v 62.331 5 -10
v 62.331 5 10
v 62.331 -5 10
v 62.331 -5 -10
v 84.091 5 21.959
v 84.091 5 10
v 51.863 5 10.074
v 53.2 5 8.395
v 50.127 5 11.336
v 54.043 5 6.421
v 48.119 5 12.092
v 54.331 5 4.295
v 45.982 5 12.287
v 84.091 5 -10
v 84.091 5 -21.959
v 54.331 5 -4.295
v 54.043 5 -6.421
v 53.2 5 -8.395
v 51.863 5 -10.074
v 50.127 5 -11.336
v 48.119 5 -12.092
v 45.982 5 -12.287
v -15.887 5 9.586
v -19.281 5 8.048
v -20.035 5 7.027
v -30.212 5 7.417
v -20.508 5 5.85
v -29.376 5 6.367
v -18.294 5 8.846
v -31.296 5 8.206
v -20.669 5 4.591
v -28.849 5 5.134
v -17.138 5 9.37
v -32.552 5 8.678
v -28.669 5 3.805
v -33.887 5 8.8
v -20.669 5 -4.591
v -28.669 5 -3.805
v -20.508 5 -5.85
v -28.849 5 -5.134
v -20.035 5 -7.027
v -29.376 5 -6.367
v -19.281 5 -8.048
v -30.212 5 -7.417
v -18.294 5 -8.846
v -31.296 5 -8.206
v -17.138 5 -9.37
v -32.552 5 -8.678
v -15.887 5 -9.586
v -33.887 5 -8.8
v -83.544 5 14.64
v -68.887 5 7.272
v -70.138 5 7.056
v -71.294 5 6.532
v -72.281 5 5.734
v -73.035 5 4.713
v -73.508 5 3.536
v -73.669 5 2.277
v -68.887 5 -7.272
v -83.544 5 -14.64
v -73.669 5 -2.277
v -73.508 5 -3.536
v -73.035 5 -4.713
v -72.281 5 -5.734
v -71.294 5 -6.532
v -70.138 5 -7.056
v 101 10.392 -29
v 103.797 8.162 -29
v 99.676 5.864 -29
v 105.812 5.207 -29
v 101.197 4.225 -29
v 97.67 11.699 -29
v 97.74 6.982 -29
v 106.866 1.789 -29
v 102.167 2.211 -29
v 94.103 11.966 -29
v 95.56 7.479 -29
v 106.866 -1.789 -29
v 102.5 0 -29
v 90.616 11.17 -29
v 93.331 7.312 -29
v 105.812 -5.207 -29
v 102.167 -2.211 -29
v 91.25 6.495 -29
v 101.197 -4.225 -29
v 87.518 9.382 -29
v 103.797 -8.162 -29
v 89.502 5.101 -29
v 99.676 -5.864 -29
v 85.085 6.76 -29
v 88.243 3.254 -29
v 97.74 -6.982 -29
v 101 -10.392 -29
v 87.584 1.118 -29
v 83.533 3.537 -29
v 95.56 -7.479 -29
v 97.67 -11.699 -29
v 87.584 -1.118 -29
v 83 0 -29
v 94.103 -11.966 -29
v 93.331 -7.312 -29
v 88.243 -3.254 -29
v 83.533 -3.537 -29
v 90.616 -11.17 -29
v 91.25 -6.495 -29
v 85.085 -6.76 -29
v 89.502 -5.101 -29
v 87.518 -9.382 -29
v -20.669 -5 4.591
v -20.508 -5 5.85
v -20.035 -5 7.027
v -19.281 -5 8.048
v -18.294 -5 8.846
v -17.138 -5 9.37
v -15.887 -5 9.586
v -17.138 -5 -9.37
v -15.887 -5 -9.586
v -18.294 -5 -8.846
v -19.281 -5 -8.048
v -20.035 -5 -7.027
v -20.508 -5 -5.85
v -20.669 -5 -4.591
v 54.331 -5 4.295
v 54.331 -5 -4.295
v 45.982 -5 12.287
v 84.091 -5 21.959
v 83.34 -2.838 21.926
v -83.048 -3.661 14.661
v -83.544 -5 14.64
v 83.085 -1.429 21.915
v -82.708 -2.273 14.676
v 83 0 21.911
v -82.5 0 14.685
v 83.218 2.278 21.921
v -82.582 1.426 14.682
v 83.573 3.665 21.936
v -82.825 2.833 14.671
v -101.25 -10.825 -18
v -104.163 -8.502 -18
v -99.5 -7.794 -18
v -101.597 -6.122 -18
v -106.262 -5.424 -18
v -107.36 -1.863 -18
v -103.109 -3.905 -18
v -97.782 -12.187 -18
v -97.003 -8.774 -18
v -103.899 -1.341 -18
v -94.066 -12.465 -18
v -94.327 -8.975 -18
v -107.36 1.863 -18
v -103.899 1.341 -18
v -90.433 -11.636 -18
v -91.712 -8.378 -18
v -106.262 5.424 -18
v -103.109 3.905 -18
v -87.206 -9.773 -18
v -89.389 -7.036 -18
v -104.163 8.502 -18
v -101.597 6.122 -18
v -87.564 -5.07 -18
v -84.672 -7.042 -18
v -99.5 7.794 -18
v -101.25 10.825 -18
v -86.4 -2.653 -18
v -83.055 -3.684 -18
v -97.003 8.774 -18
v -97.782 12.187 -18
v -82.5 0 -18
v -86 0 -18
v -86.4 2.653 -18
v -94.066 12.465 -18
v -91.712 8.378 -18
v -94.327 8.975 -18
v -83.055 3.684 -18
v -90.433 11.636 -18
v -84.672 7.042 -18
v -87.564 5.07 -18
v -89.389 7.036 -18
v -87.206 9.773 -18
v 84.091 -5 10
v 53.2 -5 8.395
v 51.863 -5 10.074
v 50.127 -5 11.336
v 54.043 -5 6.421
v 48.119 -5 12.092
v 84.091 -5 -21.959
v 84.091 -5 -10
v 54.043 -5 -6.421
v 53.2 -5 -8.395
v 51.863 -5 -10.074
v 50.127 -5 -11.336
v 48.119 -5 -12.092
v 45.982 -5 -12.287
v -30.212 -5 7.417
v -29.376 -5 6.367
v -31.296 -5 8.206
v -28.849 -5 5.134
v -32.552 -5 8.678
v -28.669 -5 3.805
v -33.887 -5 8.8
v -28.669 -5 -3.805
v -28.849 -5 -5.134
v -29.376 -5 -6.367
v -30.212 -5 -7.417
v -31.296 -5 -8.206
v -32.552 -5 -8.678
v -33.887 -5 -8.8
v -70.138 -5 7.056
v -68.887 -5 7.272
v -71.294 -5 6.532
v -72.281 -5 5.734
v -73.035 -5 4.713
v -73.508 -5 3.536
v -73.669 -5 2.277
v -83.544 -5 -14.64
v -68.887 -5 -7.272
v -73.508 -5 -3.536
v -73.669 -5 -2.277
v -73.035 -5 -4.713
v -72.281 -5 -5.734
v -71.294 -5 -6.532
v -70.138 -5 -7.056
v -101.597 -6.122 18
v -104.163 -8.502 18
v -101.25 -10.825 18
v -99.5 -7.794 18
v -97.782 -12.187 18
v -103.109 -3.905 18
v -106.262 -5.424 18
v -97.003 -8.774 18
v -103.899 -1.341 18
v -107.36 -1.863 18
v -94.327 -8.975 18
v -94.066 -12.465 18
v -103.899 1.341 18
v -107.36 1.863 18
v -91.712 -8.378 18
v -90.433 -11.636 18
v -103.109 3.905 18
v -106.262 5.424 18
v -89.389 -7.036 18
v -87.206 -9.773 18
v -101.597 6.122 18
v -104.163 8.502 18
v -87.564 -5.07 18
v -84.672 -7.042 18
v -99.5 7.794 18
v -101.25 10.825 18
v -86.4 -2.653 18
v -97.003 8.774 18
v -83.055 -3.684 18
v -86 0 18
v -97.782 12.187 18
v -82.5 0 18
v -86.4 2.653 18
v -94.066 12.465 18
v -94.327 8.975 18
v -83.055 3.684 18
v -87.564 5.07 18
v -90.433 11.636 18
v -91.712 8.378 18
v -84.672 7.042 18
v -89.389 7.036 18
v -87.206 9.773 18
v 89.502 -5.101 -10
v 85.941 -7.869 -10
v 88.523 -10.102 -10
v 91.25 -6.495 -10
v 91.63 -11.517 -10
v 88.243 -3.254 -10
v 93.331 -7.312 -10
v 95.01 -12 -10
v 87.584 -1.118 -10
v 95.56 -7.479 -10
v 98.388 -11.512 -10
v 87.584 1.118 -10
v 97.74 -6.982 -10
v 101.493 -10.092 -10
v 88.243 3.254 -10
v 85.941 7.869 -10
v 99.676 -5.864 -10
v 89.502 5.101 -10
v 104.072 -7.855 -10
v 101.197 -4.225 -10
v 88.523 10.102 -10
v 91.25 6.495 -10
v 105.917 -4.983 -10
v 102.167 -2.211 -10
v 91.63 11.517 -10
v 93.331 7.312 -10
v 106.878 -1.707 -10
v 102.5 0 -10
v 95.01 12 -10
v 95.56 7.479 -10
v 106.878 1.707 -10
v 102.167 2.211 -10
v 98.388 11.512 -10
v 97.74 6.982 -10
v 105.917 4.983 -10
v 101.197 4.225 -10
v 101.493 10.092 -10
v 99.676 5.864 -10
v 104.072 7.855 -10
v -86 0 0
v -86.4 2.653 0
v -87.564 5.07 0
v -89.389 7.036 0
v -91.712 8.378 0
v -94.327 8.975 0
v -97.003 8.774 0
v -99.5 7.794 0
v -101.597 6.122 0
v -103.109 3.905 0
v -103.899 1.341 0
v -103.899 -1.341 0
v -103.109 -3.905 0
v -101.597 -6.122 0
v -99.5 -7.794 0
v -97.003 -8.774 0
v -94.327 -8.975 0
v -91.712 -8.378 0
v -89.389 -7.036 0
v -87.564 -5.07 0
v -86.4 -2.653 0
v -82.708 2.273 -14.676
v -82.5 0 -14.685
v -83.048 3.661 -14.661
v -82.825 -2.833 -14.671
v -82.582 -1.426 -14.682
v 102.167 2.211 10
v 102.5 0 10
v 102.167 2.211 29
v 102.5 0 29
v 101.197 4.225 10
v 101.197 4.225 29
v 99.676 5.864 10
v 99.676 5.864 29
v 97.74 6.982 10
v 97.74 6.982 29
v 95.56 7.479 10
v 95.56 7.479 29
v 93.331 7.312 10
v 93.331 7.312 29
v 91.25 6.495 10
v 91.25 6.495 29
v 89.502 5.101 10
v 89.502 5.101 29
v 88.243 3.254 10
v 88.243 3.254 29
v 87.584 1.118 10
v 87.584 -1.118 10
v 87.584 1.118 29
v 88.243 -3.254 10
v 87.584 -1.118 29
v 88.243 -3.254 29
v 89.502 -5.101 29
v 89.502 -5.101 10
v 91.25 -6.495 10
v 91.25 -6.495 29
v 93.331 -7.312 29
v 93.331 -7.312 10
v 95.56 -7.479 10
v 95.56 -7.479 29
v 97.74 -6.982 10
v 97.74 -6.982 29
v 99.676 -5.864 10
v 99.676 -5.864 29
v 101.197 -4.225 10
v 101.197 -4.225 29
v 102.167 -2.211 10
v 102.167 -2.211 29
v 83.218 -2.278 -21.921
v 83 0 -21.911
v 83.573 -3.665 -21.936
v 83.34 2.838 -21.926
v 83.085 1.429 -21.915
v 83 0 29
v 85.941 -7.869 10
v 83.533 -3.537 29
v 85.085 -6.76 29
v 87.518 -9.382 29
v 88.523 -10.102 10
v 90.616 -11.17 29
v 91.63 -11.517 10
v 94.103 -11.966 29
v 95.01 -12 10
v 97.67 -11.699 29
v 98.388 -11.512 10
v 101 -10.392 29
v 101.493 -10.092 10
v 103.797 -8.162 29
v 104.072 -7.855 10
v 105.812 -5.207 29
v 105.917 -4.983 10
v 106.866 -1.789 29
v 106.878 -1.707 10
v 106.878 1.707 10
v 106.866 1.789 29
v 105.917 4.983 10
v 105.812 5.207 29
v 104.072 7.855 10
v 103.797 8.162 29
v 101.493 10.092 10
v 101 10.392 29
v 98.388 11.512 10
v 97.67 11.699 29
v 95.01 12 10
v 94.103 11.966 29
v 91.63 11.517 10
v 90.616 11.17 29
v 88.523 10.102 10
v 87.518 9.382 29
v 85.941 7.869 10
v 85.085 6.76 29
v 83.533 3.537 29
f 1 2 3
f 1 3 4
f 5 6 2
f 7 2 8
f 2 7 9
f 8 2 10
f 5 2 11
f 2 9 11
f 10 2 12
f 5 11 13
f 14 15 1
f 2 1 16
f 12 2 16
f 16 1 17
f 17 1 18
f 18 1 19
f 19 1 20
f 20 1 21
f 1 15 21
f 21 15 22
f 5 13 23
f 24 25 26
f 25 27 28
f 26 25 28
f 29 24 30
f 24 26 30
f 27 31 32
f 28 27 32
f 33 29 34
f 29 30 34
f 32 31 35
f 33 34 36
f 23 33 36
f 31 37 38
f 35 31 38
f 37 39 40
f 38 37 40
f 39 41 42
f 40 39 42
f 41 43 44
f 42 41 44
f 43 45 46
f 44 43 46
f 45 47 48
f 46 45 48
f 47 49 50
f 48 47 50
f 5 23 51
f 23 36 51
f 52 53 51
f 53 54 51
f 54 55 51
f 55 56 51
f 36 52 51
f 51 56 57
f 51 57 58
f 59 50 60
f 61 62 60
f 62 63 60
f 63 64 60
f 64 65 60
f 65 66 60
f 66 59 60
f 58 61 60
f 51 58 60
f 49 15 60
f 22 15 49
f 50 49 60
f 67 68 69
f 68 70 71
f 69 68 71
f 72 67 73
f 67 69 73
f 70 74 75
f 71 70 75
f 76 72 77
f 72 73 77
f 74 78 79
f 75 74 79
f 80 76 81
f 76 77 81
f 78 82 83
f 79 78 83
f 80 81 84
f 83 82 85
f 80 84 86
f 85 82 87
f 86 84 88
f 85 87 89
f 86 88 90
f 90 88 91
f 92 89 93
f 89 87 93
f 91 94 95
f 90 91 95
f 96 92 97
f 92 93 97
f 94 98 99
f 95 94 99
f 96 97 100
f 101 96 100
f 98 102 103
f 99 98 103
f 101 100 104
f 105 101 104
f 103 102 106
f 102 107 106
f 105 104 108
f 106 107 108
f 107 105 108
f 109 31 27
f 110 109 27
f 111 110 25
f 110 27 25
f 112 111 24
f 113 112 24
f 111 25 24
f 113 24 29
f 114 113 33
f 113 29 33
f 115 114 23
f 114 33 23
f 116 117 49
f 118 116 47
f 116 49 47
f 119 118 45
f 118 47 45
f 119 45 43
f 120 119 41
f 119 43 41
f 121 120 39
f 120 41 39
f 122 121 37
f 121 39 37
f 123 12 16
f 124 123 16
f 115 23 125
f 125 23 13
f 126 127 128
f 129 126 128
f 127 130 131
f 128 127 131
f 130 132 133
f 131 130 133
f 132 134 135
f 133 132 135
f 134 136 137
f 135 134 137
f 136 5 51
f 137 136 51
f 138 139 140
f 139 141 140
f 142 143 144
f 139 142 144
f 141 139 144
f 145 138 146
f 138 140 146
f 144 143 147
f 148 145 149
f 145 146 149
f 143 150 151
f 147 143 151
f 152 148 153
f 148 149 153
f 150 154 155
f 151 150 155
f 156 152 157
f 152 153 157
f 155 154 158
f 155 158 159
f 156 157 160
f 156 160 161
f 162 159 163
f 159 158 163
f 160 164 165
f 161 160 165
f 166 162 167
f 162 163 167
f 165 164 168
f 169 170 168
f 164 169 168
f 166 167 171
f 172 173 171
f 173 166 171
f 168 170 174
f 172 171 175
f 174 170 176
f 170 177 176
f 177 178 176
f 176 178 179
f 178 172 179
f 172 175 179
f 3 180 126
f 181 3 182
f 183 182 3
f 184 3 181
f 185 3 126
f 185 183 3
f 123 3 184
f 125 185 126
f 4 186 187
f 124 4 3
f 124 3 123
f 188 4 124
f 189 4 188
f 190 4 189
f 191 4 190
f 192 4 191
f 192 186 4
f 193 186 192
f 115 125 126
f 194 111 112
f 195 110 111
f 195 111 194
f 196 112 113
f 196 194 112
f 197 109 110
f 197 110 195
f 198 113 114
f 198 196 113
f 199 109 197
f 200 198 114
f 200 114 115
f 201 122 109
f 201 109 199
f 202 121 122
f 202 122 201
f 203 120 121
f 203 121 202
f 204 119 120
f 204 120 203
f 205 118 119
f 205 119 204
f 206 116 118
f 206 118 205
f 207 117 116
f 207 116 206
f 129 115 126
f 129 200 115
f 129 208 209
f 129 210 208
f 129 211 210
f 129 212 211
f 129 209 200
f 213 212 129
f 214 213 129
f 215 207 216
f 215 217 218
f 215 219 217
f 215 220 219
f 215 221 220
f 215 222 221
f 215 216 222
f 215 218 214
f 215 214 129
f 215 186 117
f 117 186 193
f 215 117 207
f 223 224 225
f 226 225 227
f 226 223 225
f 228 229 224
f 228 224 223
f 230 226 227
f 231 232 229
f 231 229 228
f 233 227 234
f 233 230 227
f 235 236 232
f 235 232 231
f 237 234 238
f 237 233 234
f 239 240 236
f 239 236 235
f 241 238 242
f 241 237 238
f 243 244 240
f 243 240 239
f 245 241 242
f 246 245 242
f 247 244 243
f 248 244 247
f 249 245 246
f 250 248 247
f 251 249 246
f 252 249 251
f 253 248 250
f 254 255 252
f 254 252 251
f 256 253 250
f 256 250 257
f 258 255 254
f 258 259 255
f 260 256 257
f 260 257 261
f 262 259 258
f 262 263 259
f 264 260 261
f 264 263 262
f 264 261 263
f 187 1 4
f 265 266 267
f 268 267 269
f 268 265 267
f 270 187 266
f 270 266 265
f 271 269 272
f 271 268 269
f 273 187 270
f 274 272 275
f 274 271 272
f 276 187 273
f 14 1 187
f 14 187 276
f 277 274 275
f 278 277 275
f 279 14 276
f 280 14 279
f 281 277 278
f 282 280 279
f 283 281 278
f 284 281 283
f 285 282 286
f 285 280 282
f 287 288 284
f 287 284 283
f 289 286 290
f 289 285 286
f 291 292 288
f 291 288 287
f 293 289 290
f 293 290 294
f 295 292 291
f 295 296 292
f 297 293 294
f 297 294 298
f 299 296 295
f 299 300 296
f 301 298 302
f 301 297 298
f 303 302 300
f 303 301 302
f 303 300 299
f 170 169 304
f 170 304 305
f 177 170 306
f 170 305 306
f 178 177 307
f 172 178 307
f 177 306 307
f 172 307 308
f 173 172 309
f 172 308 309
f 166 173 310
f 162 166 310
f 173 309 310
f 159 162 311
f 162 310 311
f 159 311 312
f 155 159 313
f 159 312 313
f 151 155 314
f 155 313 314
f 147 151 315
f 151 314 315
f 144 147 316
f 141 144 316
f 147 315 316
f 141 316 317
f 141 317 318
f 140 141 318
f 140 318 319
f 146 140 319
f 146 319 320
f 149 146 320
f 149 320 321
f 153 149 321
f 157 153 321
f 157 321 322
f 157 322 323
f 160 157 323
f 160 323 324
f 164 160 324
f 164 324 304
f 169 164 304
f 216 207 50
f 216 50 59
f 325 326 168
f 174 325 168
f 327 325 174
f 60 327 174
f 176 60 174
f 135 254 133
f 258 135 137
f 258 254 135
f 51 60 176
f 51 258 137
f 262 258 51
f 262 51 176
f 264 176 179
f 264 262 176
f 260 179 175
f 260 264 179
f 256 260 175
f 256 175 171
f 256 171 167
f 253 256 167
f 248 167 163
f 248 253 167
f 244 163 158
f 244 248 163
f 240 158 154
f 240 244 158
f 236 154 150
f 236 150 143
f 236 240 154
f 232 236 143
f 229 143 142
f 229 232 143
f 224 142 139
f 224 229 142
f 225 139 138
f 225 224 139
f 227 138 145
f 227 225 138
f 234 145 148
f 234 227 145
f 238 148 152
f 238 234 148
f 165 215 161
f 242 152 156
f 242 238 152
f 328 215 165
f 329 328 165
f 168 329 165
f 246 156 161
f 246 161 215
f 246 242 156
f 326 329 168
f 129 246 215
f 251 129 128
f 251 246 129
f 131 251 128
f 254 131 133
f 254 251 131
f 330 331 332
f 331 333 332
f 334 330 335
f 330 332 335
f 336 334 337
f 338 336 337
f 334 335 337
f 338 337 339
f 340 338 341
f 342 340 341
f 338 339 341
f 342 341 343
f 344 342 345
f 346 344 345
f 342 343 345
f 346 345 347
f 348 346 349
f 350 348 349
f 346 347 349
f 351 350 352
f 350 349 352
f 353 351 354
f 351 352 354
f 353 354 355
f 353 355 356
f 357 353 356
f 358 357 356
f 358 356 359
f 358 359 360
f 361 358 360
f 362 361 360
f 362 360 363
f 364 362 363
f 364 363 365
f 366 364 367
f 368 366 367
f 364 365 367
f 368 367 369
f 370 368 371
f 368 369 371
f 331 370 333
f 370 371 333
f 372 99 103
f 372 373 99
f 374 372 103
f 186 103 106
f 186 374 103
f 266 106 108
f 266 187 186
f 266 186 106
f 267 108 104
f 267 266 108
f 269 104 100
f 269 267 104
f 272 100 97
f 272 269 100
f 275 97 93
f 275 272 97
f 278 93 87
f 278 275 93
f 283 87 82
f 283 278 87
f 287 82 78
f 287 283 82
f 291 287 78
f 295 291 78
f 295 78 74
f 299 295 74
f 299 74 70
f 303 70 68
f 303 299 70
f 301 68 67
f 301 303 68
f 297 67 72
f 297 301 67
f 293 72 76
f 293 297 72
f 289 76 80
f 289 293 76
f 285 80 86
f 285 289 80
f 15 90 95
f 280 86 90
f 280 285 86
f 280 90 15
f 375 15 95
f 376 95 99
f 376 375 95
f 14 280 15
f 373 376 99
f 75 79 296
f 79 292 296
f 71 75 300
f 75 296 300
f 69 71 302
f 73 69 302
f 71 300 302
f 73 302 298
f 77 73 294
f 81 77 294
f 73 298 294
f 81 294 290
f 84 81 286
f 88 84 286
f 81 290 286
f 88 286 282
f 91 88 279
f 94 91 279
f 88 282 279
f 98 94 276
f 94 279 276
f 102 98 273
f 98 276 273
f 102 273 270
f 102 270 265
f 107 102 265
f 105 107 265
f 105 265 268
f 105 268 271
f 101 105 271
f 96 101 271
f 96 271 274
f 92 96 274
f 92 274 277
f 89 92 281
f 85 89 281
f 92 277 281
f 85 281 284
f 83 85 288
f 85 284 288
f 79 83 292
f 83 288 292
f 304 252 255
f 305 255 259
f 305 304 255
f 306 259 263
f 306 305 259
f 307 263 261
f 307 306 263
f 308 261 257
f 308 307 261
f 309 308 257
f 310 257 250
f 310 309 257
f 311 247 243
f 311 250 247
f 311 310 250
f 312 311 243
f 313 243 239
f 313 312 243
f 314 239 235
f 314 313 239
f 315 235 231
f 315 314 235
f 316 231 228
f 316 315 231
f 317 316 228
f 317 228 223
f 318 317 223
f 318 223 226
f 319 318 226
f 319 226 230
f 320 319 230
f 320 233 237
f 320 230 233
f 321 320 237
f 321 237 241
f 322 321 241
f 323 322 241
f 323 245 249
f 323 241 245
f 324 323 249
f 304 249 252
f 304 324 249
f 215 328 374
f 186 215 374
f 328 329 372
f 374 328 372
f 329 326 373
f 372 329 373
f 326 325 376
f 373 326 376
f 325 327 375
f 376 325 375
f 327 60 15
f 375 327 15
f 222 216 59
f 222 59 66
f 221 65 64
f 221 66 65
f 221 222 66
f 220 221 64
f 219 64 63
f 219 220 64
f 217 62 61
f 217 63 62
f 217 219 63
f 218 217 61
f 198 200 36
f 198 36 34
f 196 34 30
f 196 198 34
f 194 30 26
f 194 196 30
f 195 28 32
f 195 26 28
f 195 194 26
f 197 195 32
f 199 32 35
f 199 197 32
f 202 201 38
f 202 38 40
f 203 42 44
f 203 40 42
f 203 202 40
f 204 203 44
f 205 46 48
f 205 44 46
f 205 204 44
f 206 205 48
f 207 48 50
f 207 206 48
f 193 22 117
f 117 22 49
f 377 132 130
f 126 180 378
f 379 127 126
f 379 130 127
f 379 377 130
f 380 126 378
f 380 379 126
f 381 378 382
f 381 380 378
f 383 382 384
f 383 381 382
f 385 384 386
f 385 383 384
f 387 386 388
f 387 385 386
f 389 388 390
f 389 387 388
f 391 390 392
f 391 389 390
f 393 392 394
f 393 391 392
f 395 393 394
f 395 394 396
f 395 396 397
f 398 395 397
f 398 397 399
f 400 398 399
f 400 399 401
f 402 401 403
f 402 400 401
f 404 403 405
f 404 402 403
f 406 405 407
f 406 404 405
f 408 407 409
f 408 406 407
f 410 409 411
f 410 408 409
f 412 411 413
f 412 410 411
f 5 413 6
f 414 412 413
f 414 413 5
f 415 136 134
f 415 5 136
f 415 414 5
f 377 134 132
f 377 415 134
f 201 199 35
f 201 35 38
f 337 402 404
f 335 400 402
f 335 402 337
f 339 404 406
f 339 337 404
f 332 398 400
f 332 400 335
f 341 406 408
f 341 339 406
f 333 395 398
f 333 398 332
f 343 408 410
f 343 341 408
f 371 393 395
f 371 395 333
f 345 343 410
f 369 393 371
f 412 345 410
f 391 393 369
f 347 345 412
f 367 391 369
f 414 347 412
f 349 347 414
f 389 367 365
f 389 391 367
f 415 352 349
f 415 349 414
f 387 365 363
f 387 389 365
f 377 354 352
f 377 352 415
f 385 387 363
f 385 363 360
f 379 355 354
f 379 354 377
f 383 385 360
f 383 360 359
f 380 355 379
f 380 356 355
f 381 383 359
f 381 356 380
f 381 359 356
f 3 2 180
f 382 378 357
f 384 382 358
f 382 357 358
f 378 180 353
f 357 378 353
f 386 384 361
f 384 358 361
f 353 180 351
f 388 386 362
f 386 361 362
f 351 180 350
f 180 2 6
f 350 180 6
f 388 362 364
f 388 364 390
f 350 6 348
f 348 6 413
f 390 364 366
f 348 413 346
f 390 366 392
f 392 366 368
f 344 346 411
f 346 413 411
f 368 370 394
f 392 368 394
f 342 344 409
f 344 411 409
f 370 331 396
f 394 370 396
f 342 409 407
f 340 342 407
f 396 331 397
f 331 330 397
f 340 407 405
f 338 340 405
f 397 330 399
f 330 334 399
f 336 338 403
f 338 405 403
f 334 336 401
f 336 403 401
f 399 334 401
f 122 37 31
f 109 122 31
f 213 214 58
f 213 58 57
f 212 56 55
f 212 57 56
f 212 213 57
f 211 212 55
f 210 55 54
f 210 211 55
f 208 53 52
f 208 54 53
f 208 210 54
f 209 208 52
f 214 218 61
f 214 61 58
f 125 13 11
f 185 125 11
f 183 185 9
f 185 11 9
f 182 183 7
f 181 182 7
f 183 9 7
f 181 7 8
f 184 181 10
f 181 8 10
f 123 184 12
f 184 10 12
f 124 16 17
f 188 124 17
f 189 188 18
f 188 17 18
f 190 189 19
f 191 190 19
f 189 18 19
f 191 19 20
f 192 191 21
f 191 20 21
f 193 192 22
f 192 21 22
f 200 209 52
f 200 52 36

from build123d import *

# Parameters (mm, degrees)
SKETCH1_R           = 12.5
BOSS_EXTRUDE1_DEPTH = 18
SKETCH2_R           = 12
BOSS_EXTRUDE2_DEPTH = 29
BOSS_EXTRUDE4_DEPTH = 5
SKETCH7_W           = 62.580609479
SKETCH7_H           = 20
CUT_EXTRUDE2_DEPTH  = 62
CUT_EXTRUDE3_DEPTH  = 62
SKETCH9_R           = 9
SKETCH9_R_2         = 7.5
CUT_EXTRUDE4_DEPTH  = 62


with BuildPart() as part:
    # Sketch1 → Boss-Extrude1 (new, symmetric)
    with BuildSketch(Plane.XY):
        with Locations((-95, 0)):
            Circle(SKETCH1_R)
    extrude(amount=BOSS_EXTRUDE1_DEPTH, both=True)



with BuildPart() as body_2:
    # Sketch2 → Boss-Extrude2 (new, symmetric)
    with BuildSketch(Plane.XY):
        with Locations(Location((95, 0, 0), (0, 0, 180))):
            Circle(SKETCH2_R)
    extrude(amount=BOSS_EXTRUDE2_DEPTH, both=True)


with BuildPart() as part_1:
    add(part.part)

    add(body_2.part)  # Boss-Extrude4 merges body 2
    # Sketch6 → Boss-Extrude4 (add, symmetric)
    with BuildSketch(Plane(origin=(0, 0, 0), x_dir=(1, 0, 0), z_dir=(0, 1, 0))):
        Polygon((95, 22.434972483), (95, -22.434972483), (-95, -14.13939333), (-95, 14.13939333), align=None)
    extrude(amount=BOSS_EXTRUDE4_DEPTH, both=True)

    # Sketch7 → Cut-Extrude2 (cut, symmetric)
    with BuildSketch(Plane(origin=(0, 5, 0), x_dir=(1, 0, 0), z_dir=(0, 1, 0))):
        with Locations((93.62091422, 0)):
            Rectangle(SKETCH7_W, SKETCH7_H)
    extrude(amount=CUT_EXTRUDE2_DEPTH, both=True, mode=Mode.SUBTRACT)

    # Sketch8 → Cut-Extrude3 (cut, symmetric)
    with BuildSketch(Plane(origin=(0, 5, 0), x_dir=(1, 0, 0), z_dir=(0, 1, 0))):
        with BuildLine():
            Line((-68.887487457, -7.271868768), (-33.887487457, -8.80000177))
            ThreePointArc((-33.887487457, -8.80000177), (-30.211825242, -7.416580473), (-28.66939052, -3.804760662))
            Line((-28.66939052, -3.804760662), (-28.66939052, 3.804760662))
            ThreePointArc((-28.66939052, 3.804760662), (-30.211825242, 7.416580473), (-33.887487457, 8.80000177))
            Line((-33.887487457, 8.80000177), (-68.887487457, 7.271868768))
            ThreePointArc((-68.887487457, 7.271868768), (-72.281210331, 5.734192939), (-73.66939052, 2.276627661))
            Line((-73.66939052, 2.276627661), (-73.66939052, -2.276627661))
            ThreePointArc((-73.66939052, -2.276627661), (-72.281210331, -5.734192939), (-68.887487457, -7.271868768))
        make_face()
        with BuildLine():
            Line((-20.66939052, 4.590657635), (-20.66939052, -4.590657635))
            ThreePointArc((-20.66939052, -4.590657635), (-19.281210331, -8.048222914), (-15.887487457, -9.585898743))
            Line((-15.887487457, -9.585898743), (45.981654381, -12.287163812))
            ThreePointArc((45.981654381, -12.287163812), (51.862713926, -10.073689736), (54.33060948, -4.29477804))
            Line((54.33060948, -4.29477804), (54.33060948, 4.29477804))
            ThreePointArc((54.33060948, 4.29477804), (51.862713926, 10.073689736), (45.981654381, 12.287163812))
            Line((45.981654381, 12.287163812), (-15.887487457, 9.585898743))
            ThreePointArc((-15.887487457, 9.585898743), (-19.281210331, 8.048222914), (-20.66939052, 4.590657635))
        make_face()
    extrude(amount=CUT_EXTRUDE3_DEPTH, both=True, mode=Mode.SUBTRACT)

    # Sketch9 → Cut-Extrude4 (cut, symmetric)
    with BuildSketch(Plane.XY):
        with Locations((-95, 0)):
            Circle(SKETCH9_R)
        with Locations((95, 0)):
            Circle(SKETCH9_R_2)
    extrude(amount=CUT_EXTRUDE4_DEPTH, both=True, mode=Mode.SUBTRACT)


solid = part_1.part
